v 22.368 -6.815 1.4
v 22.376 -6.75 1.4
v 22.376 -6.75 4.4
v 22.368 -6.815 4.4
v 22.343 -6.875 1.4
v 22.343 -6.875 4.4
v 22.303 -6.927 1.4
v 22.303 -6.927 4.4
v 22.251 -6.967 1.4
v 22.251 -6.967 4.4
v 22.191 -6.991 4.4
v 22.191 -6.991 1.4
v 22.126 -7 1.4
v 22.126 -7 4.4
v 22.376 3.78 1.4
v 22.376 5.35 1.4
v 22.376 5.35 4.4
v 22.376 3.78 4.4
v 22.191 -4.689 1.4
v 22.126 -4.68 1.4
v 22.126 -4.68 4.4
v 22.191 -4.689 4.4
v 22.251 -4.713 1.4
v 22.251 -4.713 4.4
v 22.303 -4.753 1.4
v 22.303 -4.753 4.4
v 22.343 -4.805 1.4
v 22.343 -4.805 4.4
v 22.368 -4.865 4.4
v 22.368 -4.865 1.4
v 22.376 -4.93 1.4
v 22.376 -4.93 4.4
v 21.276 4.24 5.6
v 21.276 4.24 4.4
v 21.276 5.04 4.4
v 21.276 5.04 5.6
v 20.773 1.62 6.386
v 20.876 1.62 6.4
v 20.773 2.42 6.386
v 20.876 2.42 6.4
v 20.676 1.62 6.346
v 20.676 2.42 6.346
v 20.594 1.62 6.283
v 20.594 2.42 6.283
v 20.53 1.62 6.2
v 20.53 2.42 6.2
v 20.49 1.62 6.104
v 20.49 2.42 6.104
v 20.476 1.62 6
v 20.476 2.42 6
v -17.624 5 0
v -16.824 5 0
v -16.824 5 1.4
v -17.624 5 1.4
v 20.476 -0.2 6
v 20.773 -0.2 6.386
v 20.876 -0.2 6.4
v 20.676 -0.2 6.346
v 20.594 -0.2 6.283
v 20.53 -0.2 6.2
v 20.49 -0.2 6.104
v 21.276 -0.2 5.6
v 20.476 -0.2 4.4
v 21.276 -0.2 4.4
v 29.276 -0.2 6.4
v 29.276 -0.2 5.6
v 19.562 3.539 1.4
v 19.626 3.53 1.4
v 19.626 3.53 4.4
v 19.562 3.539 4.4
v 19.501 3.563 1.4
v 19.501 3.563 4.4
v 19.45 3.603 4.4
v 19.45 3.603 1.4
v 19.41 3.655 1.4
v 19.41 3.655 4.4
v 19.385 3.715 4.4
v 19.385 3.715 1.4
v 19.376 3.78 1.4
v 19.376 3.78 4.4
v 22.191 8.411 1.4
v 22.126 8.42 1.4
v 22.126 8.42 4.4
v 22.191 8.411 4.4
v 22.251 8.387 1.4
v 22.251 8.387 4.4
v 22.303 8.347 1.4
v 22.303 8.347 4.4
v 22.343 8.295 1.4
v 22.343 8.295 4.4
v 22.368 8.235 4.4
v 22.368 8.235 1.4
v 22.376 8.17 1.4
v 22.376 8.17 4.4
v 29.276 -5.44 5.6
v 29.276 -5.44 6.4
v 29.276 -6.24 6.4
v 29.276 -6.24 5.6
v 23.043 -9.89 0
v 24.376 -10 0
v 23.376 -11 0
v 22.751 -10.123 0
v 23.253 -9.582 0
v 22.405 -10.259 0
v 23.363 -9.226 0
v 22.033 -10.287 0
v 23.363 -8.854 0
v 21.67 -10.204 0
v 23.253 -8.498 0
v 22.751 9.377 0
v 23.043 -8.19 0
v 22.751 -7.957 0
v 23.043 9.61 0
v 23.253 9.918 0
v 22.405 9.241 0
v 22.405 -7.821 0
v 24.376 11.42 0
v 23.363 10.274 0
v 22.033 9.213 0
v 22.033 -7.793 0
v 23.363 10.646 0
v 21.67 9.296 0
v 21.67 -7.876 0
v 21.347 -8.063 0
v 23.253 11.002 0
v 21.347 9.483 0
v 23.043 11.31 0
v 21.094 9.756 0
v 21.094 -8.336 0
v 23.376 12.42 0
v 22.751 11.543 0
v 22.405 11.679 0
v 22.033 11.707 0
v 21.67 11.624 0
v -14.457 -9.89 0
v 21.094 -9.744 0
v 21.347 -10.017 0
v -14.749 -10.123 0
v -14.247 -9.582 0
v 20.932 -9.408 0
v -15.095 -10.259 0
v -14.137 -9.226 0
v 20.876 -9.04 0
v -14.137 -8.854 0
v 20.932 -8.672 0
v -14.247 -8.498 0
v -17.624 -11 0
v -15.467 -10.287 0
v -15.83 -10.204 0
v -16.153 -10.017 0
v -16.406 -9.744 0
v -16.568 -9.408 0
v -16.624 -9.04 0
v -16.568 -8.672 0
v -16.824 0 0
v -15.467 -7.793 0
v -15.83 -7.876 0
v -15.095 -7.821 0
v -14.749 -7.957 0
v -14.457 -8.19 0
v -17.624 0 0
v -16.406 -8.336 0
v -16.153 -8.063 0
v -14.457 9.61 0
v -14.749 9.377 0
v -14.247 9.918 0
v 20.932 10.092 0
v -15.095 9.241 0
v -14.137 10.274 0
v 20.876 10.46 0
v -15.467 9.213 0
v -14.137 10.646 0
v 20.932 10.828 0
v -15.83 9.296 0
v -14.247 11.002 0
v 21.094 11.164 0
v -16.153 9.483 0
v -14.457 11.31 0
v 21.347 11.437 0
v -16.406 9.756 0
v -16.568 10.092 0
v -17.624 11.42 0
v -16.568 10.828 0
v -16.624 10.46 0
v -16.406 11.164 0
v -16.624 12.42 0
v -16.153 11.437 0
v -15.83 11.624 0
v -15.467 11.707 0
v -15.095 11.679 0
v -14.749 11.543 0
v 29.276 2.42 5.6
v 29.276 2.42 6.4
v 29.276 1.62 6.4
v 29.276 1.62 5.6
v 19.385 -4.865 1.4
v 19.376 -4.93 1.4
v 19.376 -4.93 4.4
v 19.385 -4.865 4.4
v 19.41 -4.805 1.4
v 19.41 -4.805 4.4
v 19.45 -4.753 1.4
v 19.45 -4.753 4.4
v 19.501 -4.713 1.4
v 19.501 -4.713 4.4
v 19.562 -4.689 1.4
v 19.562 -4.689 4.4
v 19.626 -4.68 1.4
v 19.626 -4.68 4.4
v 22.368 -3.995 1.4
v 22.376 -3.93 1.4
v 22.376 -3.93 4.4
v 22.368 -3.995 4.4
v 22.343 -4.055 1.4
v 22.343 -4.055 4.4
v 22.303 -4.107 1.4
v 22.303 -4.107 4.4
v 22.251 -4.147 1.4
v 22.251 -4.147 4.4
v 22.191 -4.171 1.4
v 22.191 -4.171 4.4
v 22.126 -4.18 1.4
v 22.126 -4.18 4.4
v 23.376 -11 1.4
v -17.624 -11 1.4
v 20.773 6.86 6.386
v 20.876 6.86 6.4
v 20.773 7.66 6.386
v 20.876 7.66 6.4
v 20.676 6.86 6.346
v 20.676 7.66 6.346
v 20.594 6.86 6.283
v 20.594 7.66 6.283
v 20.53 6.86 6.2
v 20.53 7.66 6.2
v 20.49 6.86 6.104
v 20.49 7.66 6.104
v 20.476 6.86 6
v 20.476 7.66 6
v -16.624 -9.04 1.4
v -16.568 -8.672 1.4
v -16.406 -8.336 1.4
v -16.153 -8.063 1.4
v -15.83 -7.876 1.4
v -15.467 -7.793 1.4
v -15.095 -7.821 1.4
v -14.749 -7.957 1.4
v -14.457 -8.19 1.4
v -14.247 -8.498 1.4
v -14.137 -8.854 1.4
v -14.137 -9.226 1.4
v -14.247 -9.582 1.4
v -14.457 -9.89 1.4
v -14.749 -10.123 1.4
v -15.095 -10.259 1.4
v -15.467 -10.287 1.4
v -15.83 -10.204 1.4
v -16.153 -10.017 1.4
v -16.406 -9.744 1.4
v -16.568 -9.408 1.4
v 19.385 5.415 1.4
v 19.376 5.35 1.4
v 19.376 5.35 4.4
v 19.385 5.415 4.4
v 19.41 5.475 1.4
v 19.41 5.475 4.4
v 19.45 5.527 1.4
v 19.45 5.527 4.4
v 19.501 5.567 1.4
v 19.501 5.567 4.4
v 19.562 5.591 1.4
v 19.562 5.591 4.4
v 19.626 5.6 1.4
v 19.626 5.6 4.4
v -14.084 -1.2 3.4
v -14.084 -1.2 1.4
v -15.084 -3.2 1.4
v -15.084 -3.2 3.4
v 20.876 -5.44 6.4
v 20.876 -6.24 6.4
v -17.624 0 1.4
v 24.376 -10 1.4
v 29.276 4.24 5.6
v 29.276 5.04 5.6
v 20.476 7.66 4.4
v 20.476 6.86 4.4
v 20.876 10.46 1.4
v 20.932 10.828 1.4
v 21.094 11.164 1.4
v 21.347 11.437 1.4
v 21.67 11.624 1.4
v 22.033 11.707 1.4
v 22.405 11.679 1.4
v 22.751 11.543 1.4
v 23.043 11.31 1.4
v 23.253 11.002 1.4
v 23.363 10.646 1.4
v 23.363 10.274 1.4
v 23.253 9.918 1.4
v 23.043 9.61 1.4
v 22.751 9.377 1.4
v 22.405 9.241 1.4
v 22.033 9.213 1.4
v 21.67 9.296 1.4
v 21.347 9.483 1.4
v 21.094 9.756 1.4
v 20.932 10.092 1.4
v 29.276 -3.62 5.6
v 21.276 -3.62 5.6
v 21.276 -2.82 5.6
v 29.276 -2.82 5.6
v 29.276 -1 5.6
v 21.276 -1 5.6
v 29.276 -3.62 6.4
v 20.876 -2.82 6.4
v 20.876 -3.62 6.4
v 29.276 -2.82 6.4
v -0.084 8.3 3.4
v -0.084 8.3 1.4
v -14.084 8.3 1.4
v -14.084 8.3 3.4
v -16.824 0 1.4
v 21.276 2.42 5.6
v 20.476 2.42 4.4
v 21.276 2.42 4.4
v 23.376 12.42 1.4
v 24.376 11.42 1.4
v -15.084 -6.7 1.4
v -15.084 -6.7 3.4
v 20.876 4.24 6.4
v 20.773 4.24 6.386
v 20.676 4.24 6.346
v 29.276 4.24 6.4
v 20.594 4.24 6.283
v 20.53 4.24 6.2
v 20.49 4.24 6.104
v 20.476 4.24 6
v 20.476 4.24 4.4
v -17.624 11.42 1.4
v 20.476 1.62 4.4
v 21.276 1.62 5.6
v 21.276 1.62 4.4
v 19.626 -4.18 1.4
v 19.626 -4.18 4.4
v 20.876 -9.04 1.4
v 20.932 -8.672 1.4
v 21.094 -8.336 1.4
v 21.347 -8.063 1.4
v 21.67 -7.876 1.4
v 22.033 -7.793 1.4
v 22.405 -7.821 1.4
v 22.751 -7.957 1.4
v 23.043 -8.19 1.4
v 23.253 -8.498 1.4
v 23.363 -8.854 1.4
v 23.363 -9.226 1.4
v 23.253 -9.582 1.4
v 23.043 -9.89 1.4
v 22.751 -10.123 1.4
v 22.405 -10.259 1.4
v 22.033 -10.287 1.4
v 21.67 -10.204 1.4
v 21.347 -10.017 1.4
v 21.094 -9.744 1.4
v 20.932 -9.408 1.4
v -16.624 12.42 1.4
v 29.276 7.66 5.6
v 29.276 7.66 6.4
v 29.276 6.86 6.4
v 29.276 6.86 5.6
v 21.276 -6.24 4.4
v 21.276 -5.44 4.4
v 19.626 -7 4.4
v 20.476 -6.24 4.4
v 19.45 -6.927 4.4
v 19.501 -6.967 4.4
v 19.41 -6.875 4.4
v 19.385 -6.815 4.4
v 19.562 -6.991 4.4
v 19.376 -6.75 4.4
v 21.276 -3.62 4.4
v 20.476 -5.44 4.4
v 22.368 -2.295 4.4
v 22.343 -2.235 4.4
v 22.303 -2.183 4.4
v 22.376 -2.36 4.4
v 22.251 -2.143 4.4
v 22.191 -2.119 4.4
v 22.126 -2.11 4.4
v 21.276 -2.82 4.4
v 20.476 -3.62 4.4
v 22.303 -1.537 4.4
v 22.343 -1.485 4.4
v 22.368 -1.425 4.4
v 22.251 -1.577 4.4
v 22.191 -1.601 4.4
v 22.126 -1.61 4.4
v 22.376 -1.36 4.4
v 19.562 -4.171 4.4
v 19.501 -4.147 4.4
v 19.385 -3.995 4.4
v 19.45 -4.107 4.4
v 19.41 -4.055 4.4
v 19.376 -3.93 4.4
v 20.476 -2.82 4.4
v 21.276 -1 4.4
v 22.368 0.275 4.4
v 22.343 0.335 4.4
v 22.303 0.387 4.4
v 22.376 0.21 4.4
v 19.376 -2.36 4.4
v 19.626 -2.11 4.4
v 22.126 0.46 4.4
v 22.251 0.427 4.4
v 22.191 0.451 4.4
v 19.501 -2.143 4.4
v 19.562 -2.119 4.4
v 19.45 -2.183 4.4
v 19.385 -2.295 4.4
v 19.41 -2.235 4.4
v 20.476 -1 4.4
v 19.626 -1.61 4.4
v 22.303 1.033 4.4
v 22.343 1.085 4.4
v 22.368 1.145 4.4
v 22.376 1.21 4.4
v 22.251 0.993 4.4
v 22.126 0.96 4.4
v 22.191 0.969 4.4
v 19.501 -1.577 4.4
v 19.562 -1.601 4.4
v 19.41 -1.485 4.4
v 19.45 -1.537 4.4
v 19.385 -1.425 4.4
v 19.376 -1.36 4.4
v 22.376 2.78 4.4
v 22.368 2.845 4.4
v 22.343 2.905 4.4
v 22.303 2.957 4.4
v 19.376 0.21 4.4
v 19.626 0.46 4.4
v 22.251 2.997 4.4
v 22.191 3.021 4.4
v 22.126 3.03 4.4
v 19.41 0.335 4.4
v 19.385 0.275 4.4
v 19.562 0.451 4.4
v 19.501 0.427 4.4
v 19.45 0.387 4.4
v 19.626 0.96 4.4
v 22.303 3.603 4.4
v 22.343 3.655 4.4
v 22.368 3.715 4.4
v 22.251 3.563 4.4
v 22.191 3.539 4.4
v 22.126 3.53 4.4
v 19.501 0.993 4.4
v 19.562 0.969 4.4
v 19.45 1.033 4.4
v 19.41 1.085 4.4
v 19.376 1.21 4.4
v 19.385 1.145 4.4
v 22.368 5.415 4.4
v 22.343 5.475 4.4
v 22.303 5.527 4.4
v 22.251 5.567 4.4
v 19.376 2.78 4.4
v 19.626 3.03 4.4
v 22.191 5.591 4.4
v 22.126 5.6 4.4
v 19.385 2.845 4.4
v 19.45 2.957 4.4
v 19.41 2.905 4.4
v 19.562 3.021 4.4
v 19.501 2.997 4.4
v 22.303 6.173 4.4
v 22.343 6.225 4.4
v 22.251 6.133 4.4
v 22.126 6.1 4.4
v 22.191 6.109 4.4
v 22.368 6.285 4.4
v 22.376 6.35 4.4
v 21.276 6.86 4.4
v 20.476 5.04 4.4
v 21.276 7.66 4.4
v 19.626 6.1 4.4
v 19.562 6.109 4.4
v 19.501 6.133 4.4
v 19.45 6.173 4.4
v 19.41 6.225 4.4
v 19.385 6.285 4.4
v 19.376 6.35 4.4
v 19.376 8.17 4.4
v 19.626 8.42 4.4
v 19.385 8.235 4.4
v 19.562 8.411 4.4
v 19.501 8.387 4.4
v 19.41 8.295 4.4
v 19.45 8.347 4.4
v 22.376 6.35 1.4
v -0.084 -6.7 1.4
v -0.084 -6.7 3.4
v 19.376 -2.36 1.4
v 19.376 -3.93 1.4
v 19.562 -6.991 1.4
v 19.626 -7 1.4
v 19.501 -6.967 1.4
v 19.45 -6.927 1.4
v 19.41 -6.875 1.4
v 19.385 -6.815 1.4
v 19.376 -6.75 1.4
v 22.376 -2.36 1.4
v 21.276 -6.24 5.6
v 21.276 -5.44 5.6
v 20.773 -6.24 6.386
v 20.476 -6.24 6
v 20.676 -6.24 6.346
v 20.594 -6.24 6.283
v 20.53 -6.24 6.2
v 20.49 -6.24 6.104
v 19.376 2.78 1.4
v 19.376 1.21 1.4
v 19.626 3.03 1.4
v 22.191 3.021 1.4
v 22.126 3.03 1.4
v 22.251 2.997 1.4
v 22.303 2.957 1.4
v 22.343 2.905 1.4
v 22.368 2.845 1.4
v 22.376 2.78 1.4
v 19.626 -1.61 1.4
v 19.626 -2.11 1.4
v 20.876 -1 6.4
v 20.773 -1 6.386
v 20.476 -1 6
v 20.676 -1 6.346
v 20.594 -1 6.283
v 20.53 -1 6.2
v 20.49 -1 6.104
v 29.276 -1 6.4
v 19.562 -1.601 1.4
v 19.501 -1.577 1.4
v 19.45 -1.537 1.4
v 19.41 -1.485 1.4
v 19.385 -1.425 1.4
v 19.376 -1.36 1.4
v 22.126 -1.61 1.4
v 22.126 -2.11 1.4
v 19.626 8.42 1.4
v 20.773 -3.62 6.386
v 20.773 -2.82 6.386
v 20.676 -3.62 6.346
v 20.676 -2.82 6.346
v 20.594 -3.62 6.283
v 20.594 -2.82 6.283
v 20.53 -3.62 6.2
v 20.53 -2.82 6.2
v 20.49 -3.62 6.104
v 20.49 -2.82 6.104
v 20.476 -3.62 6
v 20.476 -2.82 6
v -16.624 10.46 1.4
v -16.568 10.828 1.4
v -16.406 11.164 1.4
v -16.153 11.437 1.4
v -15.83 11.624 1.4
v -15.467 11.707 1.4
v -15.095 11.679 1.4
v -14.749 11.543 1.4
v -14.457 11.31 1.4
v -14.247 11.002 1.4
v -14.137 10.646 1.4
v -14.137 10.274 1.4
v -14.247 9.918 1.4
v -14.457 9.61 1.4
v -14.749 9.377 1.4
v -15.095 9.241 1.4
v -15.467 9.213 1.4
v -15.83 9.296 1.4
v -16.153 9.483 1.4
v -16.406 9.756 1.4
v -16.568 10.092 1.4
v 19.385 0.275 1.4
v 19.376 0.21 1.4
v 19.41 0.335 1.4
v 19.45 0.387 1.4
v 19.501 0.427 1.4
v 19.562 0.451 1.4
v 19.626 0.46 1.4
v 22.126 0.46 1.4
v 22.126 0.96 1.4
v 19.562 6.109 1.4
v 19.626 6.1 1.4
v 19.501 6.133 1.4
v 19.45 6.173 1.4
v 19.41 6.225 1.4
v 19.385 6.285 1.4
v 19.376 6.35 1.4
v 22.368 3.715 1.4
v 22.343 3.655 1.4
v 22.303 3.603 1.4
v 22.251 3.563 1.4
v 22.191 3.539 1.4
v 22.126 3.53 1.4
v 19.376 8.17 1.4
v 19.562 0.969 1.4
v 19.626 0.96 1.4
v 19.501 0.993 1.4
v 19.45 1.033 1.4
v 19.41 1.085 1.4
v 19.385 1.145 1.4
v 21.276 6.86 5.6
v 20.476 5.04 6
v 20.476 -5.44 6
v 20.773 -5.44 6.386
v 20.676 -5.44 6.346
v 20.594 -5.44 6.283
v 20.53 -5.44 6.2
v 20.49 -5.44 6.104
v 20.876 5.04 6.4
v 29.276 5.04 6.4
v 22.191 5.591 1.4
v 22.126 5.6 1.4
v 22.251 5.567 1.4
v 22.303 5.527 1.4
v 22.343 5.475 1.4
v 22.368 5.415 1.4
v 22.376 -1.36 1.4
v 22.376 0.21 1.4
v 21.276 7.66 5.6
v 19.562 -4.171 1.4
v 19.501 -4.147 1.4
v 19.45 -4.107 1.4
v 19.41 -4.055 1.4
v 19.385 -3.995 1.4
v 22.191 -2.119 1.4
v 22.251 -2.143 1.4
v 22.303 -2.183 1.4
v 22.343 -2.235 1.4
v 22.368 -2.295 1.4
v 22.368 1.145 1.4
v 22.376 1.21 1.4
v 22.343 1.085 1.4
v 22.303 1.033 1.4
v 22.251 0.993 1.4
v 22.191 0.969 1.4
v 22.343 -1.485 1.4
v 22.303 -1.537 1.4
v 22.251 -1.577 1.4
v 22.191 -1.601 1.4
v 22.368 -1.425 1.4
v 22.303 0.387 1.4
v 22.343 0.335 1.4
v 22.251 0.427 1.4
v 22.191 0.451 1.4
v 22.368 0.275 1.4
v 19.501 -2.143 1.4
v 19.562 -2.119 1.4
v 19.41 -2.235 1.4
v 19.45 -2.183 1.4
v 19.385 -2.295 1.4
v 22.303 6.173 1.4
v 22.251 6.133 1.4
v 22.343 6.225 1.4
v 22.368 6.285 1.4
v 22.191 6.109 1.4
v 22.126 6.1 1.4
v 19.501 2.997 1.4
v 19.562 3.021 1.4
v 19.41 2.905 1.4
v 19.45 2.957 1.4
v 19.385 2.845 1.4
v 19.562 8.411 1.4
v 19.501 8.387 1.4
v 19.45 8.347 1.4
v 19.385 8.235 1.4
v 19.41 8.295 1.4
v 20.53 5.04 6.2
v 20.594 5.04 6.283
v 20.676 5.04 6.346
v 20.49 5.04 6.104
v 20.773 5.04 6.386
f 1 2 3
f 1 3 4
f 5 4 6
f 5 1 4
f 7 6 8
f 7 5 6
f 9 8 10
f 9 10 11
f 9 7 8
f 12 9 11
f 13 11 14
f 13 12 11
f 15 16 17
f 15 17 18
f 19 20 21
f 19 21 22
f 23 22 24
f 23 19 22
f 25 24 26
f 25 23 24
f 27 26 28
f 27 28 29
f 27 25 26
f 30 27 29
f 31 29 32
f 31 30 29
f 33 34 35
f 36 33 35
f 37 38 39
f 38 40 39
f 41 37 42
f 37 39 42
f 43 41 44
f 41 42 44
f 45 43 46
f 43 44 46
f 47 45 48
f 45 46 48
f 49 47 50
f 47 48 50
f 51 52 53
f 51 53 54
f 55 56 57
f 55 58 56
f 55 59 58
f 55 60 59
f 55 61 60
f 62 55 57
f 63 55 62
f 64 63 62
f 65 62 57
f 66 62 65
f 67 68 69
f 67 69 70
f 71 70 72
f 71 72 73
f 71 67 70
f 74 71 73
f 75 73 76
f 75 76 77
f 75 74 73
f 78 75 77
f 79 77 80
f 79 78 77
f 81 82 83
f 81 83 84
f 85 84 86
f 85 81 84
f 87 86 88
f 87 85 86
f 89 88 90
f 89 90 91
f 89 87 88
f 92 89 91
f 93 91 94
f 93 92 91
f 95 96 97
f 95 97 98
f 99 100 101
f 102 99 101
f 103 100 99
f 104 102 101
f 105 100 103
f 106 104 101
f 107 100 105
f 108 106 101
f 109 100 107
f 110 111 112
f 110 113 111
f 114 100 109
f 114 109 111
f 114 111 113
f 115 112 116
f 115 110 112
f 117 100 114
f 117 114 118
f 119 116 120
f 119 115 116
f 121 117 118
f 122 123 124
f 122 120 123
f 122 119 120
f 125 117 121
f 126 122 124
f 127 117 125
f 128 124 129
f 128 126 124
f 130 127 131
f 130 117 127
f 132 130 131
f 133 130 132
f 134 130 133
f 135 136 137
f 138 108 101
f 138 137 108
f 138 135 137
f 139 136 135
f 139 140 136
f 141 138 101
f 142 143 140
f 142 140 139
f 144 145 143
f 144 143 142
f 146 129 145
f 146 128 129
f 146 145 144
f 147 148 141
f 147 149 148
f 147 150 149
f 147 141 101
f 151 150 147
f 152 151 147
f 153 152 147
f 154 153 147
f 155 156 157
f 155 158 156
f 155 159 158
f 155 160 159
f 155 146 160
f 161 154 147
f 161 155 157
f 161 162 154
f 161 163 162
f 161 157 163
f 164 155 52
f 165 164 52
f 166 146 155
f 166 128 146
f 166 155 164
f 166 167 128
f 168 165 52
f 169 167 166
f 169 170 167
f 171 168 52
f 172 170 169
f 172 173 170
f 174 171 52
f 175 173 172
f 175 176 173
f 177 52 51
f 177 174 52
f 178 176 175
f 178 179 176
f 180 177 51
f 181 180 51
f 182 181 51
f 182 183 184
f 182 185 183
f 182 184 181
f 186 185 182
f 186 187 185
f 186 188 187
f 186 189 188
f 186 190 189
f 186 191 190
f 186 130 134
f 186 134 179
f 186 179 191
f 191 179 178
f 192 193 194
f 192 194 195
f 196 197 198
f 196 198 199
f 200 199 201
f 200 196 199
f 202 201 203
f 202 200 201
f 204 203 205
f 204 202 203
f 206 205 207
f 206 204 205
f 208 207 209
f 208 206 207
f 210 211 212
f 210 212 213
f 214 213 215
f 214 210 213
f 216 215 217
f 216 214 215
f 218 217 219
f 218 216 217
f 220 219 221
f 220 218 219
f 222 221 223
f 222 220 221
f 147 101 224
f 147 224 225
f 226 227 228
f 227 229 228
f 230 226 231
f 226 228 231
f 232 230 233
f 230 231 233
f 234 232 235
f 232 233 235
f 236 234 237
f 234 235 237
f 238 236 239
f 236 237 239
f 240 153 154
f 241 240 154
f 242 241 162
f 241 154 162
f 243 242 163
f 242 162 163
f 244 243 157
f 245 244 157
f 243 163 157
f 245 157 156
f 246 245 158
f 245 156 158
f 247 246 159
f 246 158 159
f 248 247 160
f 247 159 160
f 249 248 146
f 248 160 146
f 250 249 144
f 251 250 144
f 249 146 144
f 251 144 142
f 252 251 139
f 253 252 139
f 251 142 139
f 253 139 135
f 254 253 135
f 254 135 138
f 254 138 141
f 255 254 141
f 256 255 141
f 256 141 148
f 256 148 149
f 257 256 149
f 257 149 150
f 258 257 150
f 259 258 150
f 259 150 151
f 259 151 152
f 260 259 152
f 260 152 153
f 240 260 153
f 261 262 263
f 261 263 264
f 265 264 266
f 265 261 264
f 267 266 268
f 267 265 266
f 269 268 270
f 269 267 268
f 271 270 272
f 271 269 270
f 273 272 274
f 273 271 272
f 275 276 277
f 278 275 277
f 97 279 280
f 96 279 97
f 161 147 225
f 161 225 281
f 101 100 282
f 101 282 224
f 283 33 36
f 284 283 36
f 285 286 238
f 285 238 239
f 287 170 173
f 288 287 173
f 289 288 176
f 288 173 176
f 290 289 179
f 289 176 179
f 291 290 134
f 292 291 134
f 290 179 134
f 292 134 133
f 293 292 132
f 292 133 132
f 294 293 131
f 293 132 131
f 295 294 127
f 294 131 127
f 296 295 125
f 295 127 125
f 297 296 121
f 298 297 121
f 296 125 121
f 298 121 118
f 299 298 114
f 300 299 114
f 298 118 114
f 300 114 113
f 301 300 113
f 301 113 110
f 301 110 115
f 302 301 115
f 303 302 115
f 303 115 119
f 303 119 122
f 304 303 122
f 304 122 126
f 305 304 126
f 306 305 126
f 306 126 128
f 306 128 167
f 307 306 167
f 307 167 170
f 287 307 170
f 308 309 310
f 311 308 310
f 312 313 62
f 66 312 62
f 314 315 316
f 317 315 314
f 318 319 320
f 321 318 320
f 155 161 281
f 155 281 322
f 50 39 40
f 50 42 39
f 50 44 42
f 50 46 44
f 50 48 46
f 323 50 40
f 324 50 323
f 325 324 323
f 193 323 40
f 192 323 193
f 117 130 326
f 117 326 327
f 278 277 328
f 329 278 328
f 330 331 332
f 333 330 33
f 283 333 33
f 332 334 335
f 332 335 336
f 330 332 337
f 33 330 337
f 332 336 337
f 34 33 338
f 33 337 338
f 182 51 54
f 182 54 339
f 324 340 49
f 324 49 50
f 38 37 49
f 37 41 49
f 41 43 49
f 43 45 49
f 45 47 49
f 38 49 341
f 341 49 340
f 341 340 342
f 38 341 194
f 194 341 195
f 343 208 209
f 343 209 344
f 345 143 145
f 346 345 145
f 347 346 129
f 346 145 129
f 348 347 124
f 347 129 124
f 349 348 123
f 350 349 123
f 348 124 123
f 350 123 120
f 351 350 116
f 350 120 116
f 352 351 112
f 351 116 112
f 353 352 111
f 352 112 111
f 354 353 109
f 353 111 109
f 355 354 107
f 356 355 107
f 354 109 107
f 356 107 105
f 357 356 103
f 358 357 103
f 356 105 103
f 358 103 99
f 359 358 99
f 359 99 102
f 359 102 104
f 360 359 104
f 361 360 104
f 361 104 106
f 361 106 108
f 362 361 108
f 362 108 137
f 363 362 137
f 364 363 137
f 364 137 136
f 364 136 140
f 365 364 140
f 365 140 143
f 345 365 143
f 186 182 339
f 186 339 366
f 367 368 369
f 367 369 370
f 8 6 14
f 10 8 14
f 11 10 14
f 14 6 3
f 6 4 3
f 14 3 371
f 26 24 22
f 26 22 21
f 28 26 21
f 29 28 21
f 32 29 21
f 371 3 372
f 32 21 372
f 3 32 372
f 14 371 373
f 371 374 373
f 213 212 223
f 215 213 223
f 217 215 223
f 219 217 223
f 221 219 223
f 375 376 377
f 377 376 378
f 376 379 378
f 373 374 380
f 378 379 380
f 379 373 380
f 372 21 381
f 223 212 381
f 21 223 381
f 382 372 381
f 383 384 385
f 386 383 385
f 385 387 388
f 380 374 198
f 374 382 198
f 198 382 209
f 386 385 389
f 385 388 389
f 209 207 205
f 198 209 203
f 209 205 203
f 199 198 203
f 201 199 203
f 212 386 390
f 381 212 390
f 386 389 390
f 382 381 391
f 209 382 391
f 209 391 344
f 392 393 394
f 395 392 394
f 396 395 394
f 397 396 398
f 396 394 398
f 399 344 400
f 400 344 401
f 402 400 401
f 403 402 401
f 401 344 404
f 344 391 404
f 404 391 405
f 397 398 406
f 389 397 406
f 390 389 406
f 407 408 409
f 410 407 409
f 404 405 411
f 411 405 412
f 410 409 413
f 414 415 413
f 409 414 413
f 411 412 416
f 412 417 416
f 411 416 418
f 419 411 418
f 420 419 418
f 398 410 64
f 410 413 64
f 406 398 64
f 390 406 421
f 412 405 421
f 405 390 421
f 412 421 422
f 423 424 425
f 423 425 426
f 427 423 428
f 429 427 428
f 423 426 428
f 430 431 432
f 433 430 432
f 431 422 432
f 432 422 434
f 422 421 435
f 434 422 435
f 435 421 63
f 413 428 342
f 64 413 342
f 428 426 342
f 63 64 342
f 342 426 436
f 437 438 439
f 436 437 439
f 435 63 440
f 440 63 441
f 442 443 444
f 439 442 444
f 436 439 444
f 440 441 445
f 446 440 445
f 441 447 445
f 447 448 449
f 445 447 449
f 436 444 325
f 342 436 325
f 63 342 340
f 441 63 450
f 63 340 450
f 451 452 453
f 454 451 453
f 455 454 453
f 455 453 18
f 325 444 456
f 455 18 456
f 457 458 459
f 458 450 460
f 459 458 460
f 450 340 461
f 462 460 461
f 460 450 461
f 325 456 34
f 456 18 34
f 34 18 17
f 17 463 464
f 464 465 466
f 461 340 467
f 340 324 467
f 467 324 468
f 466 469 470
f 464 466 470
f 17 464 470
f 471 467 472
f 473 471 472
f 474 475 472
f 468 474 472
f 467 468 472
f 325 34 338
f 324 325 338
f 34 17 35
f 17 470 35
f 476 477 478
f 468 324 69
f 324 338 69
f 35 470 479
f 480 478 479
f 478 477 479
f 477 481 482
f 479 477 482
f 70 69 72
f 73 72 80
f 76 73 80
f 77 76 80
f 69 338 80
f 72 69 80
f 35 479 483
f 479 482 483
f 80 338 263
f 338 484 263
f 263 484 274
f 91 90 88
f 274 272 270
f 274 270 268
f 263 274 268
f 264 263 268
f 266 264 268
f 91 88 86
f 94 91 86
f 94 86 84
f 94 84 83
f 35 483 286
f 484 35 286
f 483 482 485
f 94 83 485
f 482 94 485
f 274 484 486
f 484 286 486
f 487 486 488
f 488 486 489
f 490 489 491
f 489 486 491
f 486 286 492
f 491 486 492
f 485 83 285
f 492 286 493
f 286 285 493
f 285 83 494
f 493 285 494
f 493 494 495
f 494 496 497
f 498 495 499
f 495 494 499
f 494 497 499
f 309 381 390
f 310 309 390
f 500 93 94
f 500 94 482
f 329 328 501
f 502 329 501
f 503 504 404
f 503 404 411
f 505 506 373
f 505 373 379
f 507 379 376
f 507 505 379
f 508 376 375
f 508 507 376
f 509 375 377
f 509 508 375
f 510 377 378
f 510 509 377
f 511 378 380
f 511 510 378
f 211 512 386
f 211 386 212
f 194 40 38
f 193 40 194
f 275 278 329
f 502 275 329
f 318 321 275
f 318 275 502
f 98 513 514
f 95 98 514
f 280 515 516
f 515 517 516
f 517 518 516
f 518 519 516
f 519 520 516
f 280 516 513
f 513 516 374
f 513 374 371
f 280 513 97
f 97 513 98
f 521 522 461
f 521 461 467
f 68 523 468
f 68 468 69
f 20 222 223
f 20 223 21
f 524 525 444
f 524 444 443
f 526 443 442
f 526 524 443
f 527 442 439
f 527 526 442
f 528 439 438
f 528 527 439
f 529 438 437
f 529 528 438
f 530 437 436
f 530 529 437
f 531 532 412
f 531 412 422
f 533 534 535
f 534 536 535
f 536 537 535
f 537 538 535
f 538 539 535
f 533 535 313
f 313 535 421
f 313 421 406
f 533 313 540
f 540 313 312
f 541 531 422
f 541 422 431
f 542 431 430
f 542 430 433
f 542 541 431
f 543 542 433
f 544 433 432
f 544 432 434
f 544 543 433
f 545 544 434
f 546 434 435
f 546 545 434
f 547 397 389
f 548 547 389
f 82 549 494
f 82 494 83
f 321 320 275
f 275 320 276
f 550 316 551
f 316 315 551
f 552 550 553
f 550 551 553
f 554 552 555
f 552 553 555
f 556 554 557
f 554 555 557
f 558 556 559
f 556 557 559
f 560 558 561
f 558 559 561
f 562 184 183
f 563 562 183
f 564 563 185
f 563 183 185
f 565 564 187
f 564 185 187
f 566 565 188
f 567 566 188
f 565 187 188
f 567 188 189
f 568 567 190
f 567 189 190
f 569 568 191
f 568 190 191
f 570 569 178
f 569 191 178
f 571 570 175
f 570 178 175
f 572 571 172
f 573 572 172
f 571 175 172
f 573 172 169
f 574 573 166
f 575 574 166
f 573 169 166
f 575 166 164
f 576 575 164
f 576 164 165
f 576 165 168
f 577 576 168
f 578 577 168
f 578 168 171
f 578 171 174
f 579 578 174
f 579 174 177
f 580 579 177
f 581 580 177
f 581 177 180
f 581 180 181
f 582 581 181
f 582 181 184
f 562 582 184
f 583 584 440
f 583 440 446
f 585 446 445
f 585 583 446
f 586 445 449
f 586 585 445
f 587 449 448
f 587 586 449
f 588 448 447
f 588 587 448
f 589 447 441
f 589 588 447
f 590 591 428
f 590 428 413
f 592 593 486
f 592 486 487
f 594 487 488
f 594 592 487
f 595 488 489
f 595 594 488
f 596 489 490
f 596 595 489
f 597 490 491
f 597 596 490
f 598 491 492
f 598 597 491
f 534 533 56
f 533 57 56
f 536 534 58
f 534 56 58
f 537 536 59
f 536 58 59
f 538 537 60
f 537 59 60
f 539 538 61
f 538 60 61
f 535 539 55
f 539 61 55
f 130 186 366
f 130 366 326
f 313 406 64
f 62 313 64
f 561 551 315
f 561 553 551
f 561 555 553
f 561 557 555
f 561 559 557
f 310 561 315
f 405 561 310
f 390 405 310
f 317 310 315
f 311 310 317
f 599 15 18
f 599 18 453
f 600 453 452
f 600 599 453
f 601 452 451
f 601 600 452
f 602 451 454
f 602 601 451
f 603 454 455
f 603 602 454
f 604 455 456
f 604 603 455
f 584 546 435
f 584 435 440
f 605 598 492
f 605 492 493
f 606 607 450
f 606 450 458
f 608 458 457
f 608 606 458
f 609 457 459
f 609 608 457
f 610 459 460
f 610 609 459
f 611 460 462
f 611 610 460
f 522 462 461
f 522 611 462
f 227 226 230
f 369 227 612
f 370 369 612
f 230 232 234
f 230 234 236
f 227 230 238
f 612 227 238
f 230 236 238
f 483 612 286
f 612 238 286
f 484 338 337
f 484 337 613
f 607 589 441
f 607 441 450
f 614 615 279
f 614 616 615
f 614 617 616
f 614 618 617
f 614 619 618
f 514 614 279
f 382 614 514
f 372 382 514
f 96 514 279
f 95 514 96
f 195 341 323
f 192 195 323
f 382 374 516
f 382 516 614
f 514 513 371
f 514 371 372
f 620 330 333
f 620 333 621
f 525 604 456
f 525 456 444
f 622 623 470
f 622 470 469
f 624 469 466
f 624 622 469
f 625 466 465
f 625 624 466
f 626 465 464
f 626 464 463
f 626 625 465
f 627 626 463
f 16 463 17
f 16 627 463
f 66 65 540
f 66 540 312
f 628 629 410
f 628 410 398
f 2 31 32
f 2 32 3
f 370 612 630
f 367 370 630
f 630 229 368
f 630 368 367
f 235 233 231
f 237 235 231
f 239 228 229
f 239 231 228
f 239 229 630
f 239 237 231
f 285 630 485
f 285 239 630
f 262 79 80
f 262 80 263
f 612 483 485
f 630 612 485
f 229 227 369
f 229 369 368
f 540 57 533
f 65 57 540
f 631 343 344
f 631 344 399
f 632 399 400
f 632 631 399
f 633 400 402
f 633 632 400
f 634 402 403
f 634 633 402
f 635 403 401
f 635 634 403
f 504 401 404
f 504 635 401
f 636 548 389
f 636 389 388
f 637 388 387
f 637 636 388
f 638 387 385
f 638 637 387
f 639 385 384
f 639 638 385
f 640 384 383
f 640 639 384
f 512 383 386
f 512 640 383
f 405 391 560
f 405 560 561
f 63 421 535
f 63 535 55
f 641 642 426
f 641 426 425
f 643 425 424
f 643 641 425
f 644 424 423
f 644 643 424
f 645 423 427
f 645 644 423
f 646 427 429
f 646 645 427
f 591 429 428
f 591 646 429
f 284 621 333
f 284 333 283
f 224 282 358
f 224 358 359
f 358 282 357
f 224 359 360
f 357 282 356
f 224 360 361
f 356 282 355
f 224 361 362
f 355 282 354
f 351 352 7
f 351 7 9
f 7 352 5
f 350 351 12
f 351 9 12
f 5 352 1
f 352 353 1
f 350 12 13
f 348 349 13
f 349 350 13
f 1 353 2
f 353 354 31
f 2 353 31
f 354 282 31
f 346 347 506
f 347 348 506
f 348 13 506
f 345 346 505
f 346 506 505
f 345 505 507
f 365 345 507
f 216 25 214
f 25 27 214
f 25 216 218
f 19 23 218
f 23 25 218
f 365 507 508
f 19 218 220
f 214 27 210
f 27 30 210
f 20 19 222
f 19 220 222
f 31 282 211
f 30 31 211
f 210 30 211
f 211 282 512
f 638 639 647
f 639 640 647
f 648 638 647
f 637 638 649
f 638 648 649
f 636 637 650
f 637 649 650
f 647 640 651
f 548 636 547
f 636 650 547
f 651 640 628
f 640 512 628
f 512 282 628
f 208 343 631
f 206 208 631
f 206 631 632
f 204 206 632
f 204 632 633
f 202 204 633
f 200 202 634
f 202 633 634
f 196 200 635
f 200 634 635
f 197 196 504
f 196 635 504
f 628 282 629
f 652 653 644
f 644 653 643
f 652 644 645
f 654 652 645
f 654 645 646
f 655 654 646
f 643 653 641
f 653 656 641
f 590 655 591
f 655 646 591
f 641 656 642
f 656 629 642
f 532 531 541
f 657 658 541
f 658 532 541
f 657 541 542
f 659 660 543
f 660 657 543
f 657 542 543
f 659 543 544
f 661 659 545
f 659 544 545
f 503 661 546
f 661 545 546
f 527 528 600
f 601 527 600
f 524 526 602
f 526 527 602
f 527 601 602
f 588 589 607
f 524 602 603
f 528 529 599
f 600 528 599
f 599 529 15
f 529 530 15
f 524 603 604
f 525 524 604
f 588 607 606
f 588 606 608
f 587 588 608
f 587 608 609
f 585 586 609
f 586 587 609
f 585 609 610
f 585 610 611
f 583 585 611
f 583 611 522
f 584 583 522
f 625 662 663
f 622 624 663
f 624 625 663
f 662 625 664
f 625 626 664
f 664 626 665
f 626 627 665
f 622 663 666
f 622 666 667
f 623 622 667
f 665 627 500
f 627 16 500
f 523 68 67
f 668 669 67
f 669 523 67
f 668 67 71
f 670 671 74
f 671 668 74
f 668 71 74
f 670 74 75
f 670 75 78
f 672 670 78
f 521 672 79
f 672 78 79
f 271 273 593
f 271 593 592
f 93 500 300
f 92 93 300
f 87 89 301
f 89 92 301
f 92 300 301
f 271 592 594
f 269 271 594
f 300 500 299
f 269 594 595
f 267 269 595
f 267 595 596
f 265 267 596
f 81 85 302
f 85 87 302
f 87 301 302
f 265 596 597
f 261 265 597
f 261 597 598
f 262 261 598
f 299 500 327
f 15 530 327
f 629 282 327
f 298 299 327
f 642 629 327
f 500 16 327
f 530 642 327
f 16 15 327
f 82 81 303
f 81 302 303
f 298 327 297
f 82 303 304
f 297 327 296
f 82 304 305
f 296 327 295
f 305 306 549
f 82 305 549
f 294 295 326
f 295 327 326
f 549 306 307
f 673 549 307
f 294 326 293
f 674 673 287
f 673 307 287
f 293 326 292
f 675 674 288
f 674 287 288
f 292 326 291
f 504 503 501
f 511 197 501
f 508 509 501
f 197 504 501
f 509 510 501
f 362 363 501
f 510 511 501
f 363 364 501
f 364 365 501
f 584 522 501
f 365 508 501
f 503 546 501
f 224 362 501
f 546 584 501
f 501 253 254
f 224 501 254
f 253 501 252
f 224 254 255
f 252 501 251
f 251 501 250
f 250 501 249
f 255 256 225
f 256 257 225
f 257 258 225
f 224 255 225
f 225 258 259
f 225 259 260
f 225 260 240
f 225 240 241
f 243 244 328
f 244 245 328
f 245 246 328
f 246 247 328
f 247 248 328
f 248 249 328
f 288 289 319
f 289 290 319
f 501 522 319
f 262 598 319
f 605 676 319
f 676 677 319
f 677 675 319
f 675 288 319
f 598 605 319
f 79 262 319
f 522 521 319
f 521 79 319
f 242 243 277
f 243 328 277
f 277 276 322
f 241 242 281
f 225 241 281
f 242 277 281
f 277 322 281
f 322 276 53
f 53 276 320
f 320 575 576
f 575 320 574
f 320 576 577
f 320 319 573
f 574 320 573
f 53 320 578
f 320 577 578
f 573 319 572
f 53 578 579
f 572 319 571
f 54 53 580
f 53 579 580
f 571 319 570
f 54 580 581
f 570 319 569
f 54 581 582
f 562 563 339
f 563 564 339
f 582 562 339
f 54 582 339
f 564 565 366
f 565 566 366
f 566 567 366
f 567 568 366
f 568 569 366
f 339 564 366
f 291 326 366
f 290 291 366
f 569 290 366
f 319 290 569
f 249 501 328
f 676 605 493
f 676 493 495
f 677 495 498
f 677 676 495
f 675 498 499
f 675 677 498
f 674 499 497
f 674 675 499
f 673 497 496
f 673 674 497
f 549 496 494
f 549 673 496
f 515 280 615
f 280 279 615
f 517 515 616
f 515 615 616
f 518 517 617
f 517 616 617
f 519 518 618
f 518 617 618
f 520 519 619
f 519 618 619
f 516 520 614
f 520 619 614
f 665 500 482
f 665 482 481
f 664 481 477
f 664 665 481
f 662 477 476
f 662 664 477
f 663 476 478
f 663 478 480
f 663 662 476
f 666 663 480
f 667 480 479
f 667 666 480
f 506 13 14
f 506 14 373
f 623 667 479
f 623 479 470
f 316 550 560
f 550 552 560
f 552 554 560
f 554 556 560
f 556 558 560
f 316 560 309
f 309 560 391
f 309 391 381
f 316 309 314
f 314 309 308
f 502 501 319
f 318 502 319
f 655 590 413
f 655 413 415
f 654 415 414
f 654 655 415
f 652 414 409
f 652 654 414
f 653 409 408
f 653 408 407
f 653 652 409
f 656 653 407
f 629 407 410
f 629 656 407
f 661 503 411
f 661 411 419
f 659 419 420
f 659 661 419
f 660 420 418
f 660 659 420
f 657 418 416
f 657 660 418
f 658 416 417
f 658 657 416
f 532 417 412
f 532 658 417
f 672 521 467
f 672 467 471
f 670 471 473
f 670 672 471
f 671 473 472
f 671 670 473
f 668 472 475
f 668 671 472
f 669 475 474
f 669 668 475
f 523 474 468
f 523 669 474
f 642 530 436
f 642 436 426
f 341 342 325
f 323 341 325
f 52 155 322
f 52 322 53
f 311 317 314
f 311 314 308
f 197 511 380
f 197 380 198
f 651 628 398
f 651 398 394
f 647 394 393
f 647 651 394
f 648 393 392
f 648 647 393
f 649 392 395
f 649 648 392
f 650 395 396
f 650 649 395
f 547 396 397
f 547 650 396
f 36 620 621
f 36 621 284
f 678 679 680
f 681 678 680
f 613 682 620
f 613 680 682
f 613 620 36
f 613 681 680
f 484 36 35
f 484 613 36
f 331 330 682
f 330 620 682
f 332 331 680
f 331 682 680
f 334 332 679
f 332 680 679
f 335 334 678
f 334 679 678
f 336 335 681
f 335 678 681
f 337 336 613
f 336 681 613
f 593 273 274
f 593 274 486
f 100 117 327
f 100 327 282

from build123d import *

# Parameters (mm, degrees)
BOSS_EXTRUDE1_DEPTH        = 1.4
F_2_5_2_5_DIAMETER_SLOT1_D = 2.5
BOSS_EXTRUDE2_DEPTH        = 2
BOSS_EXTRUDE3_DEPTH        = 3
SKETCH8_W                  = 0.8
SKETCH8_H                  = 0.8
BOSS_EXTRUDE4_DEPTH        = 2
SKETCH9_W                  = 0.8
SKETCH9_H                  = 0.8
BOSS_EXTRUDE5_DEPTH        = 8
LPATTERN1_COUNT            = 6
LPATTERN1_PITCH            = 2.62
FILLET1_R                  = 0.4


with BuildPart() as part:
    # Sketch1 → Boss-Extrude1 (new body)
    with BuildSketch(Plane.XY):
        Polygon((-17.623529412, 11.42), (-16.623529412, 12.42), (23.376470588, 12.42), (24.376470588, 11.42), (24.376470588, -10), (23.376470588, -11), (-17.623529412, -11), (-17.623529412, 0), (-16.823529412, 0), (-16.823529412, 5), (-17.623529412, 5), align=None)
    extrude(amount=BOSS_EXTRUDE1_DEPTH)

    # Ø2.5 (2.5) Diameter Slot1 (through all)
    with Locations(Plane.XY.offset(1.4)):
        with Locations((-15.373529412, -9.04), (-15.373529412, 10.46), (22.126470588, -9.04), (22.126470588, 10.46)):
            Hole(F_2_5_2_5_DIAMETER_SLOT1_D / 2)

    # Sketch6 → Boss-Extrude2 (add)
    with BuildSketch(Plane.XY.offset(1.4)):
        Polygon((-15.083529412, -6.7), (-0.083529412, -6.7), (-0.083529412, 8.3), (-14.083529412, 8.3), (-14.083529412, -1.2), (-15.083529412, -3.2), align=None)
    extrude(amount=BOSS_EXTRUDE2_DEPTH)

    # Sketch7 → Boss-Extrude3 (add)
    with BuildSketch(Plane.XY.offset(1.4)):
        with BuildLine():
            Line((22.126470588, 6.1), (22.126470588, 5.6))
            ThreePointArc((22.126470588, 5.6), (22.303247284, 5.526776695), (22.376470588, 5.35))
            Line((22.376470588, 5.35), (22.376470588, 3.78))
            ThreePointArc((22.376470588, 3.78), (22.303247284, 3.603223305), (22.126470588, 3.53))
            Line((22.126470588, 3.53), (22.126470588, 3.03))
            ThreePointArc((22.126470588, 3.03), (22.303247284, 2.956776695), (22.376470588, 2.78))
            Line((22.376470588, 2.78), (22.376470588, 1.21))
            ThreePointArc((22.376470588, 1.21), (22.303247284, 1.033223305), (22.126470588, 0.96))
            Line((22.126470588, 0.96), (22.126470588, 0.46))
            ThreePointArc((22.126470588, 0.46), (22.303247284, 0.386776695), (22.376470588, 0.21))
            Line((22.376470588, 0.21), (22.376470588, -1.36))
            ThreePointArc((22.376470588, -1.36), (22.303247284, -1.536776695), (22.126470588, -1.61))
            Line((22.126470588, -1.61), (22.126470588, -2.11))
            ThreePointArc((22.126470588, -2.11), (22.303247284, -2.183223305), (22.376470588, -2.36))
            Line((22.376470588, -2.36), (22.376470588, -3.93))
            ThreePointArc((22.376470588, -3.93), (22.303247284, -4.106776695), (22.126470588, -4.18))
            Line((22.126470588, -4.18), (22.126470588, -4.68))
            ThreePointArc((22.126470588, -4.68), (22.303247284, -4.753223305), (22.376470588, -4.93))
            Line((22.376470588, -4.93), (22.376470588, -6.75))
            ThreePointArc((22.376470588, -6.75), (22.303247284, -6.926776695), (22.126470588, -7))
            Line((22.126470588, -7), (19.626470588, -7))
            ThreePointArc((19.626470588, -7), (19.449693893, -6.926776695), (19.376470588, -6.75))
            Line((19.376470588, -6.75), (19.376470588, -4.93))
            ThreePointArc((19.376470588, -4.93), (19.449693893, -4.753223305), (19.626470588, -4.68))
            Line((19.626470588, -4.68), (19.626470588, -4.18))
            ThreePointArc((19.626470588, -4.18), (19.449693893, -4.106776695), (19.376470588, -3.93))
            Line((19.376470588, -3.93), (19.376470588, -2.36))
            ThreePointArc((19.376470588, -2.36), (19.449693893, -2.183223305), (19.626470588, -2.11))
            Line((19.626470588, -2.11), (19.626470588, -1.61))
            ThreePointArc((19.626470588, -1.61), (19.449693893, -1.536776695), (19.376470588, -1.36))
            Line((19.376470588, -1.36), (19.376470588, 0.21))
            ThreePointArc((19.376470588, 0.21), (19.449693893, 0.386776695), (19.626470588, 0.46))
            Line((19.626470588, 0.46), (19.626470588, 0.96))
            ThreePointArc((19.626470588, 0.96), (19.449693893, 1.033223305), (19.376470588, 1.21))
            Line((19.376470588, 1.21), (19.376470588, 2.78))
            ThreePointArc((19.376470588, 2.78), (19.449693893, 2.956776695), (19.626470588, 3.03))
            Line((19.626470588, 3.03), (19.626470588, 3.53))
            ThreePointArc((19.626470588, 3.53), (19.449693893, 3.603223305), (19.376470588, 3.78))
            Line((19.376470588, 3.78), (19.376470588, 5.35))
            ThreePointArc((19.376470588, 5.35), (19.449693893, 5.526776695), (19.626470588, 5.6))
            Line((19.626470588, 5.6), (19.626470588, 6.1))
            ThreePointArc((19.626470588, 6.1), (19.449693893, 6.173223305), (19.376470588, 6.35))
            Line((19.376470588, 6.35), (19.376470588, 8.17))
            ThreePointArc((19.376470588, 8.17), (19.449693893, 8.346776695), (19.626470588, 8.42))
            Line((19.626470588, 8.42), (22.126470588, 8.42))
            ThreePointArc((22.126470588, 8.42), (22.303247284, 8.346776695), (22.376470588, 8.17))
            Line((22.376470588, 8.17), (22.376470588, 6.35))
            ThreePointArc((22.376470588, 6.35), (22.303247284, 6.173223305), (22.126470588, 6.1))
        make_face()
    extrude(amount=BOSS_EXTRUDE3_DEPTH)

    # Sketch8 → Boss-Extrude4 (add)
    with BuildSketch(Plane.XY.offset(4.4)):
        with Locations((20.876470588, -5.84)):
            Rectangle(SKETCH8_W, SKETCH8_H)
        with Locations((20.876470588, -3.22)):
            Rectangle(SKETCH8_W, SKETCH8_H)
        with Locations((20.876470588, -0.6)):
            Rectangle(SKETCH8_W, SKETCH8_H)
        with Locations((20.876470588, 2.02)):
            Rectangle(SKETCH8_W, SKETCH8_H)
        with Locations((20.876470588, 4.64)):
            Rectangle(SKETCH8_W, SKETCH8_H)
        with Locations((20.876470588, 7.26)):
            Rectangle(SKETCH8_W, SKETCH8_H)
    extrude(amount=BOSS_EXTRUDE4_DEPTH)

    # Sketch9 → Boss-Extrude5 (add)
    with BuildSketch(Plane(origin=(21.276470588, 0, 0), x_dir=(0, 0, -1), z_dir=(1, 0, 0))):
        with Locations((-6, 7.26)):
            Rectangle(SKETCH9_W, SKETCH9_H)
    boss_extrude5 = extrude(amount=BOSS_EXTRUDE5_DEPTH)

    # LPattern1: Boss-Extrude5 ×6
    with Locations(*[(0, -i * LPATTERN1_PITCH, 0) for i in range(1, LPATTERN1_COUNT)]):
        add(boss_extrude5)

    # Fillet1
    fillet1_edges = [part.edges().sort_by_distance(p)[0] for p in [
        (20.476470588, -5.84, 6.4),
        (20.476470588, -3.22, 6.4),
        (20.476470588, -0.6, 6.4),
        (20.476470588, 2.02, 6.4),
        (20.476470588, 4.64, 6.4),
        (20.476470588, 7.26, 6.4),
    ]]
    fillet(fillet1_edges, radius=FILLET1_R)


solid = part.part
